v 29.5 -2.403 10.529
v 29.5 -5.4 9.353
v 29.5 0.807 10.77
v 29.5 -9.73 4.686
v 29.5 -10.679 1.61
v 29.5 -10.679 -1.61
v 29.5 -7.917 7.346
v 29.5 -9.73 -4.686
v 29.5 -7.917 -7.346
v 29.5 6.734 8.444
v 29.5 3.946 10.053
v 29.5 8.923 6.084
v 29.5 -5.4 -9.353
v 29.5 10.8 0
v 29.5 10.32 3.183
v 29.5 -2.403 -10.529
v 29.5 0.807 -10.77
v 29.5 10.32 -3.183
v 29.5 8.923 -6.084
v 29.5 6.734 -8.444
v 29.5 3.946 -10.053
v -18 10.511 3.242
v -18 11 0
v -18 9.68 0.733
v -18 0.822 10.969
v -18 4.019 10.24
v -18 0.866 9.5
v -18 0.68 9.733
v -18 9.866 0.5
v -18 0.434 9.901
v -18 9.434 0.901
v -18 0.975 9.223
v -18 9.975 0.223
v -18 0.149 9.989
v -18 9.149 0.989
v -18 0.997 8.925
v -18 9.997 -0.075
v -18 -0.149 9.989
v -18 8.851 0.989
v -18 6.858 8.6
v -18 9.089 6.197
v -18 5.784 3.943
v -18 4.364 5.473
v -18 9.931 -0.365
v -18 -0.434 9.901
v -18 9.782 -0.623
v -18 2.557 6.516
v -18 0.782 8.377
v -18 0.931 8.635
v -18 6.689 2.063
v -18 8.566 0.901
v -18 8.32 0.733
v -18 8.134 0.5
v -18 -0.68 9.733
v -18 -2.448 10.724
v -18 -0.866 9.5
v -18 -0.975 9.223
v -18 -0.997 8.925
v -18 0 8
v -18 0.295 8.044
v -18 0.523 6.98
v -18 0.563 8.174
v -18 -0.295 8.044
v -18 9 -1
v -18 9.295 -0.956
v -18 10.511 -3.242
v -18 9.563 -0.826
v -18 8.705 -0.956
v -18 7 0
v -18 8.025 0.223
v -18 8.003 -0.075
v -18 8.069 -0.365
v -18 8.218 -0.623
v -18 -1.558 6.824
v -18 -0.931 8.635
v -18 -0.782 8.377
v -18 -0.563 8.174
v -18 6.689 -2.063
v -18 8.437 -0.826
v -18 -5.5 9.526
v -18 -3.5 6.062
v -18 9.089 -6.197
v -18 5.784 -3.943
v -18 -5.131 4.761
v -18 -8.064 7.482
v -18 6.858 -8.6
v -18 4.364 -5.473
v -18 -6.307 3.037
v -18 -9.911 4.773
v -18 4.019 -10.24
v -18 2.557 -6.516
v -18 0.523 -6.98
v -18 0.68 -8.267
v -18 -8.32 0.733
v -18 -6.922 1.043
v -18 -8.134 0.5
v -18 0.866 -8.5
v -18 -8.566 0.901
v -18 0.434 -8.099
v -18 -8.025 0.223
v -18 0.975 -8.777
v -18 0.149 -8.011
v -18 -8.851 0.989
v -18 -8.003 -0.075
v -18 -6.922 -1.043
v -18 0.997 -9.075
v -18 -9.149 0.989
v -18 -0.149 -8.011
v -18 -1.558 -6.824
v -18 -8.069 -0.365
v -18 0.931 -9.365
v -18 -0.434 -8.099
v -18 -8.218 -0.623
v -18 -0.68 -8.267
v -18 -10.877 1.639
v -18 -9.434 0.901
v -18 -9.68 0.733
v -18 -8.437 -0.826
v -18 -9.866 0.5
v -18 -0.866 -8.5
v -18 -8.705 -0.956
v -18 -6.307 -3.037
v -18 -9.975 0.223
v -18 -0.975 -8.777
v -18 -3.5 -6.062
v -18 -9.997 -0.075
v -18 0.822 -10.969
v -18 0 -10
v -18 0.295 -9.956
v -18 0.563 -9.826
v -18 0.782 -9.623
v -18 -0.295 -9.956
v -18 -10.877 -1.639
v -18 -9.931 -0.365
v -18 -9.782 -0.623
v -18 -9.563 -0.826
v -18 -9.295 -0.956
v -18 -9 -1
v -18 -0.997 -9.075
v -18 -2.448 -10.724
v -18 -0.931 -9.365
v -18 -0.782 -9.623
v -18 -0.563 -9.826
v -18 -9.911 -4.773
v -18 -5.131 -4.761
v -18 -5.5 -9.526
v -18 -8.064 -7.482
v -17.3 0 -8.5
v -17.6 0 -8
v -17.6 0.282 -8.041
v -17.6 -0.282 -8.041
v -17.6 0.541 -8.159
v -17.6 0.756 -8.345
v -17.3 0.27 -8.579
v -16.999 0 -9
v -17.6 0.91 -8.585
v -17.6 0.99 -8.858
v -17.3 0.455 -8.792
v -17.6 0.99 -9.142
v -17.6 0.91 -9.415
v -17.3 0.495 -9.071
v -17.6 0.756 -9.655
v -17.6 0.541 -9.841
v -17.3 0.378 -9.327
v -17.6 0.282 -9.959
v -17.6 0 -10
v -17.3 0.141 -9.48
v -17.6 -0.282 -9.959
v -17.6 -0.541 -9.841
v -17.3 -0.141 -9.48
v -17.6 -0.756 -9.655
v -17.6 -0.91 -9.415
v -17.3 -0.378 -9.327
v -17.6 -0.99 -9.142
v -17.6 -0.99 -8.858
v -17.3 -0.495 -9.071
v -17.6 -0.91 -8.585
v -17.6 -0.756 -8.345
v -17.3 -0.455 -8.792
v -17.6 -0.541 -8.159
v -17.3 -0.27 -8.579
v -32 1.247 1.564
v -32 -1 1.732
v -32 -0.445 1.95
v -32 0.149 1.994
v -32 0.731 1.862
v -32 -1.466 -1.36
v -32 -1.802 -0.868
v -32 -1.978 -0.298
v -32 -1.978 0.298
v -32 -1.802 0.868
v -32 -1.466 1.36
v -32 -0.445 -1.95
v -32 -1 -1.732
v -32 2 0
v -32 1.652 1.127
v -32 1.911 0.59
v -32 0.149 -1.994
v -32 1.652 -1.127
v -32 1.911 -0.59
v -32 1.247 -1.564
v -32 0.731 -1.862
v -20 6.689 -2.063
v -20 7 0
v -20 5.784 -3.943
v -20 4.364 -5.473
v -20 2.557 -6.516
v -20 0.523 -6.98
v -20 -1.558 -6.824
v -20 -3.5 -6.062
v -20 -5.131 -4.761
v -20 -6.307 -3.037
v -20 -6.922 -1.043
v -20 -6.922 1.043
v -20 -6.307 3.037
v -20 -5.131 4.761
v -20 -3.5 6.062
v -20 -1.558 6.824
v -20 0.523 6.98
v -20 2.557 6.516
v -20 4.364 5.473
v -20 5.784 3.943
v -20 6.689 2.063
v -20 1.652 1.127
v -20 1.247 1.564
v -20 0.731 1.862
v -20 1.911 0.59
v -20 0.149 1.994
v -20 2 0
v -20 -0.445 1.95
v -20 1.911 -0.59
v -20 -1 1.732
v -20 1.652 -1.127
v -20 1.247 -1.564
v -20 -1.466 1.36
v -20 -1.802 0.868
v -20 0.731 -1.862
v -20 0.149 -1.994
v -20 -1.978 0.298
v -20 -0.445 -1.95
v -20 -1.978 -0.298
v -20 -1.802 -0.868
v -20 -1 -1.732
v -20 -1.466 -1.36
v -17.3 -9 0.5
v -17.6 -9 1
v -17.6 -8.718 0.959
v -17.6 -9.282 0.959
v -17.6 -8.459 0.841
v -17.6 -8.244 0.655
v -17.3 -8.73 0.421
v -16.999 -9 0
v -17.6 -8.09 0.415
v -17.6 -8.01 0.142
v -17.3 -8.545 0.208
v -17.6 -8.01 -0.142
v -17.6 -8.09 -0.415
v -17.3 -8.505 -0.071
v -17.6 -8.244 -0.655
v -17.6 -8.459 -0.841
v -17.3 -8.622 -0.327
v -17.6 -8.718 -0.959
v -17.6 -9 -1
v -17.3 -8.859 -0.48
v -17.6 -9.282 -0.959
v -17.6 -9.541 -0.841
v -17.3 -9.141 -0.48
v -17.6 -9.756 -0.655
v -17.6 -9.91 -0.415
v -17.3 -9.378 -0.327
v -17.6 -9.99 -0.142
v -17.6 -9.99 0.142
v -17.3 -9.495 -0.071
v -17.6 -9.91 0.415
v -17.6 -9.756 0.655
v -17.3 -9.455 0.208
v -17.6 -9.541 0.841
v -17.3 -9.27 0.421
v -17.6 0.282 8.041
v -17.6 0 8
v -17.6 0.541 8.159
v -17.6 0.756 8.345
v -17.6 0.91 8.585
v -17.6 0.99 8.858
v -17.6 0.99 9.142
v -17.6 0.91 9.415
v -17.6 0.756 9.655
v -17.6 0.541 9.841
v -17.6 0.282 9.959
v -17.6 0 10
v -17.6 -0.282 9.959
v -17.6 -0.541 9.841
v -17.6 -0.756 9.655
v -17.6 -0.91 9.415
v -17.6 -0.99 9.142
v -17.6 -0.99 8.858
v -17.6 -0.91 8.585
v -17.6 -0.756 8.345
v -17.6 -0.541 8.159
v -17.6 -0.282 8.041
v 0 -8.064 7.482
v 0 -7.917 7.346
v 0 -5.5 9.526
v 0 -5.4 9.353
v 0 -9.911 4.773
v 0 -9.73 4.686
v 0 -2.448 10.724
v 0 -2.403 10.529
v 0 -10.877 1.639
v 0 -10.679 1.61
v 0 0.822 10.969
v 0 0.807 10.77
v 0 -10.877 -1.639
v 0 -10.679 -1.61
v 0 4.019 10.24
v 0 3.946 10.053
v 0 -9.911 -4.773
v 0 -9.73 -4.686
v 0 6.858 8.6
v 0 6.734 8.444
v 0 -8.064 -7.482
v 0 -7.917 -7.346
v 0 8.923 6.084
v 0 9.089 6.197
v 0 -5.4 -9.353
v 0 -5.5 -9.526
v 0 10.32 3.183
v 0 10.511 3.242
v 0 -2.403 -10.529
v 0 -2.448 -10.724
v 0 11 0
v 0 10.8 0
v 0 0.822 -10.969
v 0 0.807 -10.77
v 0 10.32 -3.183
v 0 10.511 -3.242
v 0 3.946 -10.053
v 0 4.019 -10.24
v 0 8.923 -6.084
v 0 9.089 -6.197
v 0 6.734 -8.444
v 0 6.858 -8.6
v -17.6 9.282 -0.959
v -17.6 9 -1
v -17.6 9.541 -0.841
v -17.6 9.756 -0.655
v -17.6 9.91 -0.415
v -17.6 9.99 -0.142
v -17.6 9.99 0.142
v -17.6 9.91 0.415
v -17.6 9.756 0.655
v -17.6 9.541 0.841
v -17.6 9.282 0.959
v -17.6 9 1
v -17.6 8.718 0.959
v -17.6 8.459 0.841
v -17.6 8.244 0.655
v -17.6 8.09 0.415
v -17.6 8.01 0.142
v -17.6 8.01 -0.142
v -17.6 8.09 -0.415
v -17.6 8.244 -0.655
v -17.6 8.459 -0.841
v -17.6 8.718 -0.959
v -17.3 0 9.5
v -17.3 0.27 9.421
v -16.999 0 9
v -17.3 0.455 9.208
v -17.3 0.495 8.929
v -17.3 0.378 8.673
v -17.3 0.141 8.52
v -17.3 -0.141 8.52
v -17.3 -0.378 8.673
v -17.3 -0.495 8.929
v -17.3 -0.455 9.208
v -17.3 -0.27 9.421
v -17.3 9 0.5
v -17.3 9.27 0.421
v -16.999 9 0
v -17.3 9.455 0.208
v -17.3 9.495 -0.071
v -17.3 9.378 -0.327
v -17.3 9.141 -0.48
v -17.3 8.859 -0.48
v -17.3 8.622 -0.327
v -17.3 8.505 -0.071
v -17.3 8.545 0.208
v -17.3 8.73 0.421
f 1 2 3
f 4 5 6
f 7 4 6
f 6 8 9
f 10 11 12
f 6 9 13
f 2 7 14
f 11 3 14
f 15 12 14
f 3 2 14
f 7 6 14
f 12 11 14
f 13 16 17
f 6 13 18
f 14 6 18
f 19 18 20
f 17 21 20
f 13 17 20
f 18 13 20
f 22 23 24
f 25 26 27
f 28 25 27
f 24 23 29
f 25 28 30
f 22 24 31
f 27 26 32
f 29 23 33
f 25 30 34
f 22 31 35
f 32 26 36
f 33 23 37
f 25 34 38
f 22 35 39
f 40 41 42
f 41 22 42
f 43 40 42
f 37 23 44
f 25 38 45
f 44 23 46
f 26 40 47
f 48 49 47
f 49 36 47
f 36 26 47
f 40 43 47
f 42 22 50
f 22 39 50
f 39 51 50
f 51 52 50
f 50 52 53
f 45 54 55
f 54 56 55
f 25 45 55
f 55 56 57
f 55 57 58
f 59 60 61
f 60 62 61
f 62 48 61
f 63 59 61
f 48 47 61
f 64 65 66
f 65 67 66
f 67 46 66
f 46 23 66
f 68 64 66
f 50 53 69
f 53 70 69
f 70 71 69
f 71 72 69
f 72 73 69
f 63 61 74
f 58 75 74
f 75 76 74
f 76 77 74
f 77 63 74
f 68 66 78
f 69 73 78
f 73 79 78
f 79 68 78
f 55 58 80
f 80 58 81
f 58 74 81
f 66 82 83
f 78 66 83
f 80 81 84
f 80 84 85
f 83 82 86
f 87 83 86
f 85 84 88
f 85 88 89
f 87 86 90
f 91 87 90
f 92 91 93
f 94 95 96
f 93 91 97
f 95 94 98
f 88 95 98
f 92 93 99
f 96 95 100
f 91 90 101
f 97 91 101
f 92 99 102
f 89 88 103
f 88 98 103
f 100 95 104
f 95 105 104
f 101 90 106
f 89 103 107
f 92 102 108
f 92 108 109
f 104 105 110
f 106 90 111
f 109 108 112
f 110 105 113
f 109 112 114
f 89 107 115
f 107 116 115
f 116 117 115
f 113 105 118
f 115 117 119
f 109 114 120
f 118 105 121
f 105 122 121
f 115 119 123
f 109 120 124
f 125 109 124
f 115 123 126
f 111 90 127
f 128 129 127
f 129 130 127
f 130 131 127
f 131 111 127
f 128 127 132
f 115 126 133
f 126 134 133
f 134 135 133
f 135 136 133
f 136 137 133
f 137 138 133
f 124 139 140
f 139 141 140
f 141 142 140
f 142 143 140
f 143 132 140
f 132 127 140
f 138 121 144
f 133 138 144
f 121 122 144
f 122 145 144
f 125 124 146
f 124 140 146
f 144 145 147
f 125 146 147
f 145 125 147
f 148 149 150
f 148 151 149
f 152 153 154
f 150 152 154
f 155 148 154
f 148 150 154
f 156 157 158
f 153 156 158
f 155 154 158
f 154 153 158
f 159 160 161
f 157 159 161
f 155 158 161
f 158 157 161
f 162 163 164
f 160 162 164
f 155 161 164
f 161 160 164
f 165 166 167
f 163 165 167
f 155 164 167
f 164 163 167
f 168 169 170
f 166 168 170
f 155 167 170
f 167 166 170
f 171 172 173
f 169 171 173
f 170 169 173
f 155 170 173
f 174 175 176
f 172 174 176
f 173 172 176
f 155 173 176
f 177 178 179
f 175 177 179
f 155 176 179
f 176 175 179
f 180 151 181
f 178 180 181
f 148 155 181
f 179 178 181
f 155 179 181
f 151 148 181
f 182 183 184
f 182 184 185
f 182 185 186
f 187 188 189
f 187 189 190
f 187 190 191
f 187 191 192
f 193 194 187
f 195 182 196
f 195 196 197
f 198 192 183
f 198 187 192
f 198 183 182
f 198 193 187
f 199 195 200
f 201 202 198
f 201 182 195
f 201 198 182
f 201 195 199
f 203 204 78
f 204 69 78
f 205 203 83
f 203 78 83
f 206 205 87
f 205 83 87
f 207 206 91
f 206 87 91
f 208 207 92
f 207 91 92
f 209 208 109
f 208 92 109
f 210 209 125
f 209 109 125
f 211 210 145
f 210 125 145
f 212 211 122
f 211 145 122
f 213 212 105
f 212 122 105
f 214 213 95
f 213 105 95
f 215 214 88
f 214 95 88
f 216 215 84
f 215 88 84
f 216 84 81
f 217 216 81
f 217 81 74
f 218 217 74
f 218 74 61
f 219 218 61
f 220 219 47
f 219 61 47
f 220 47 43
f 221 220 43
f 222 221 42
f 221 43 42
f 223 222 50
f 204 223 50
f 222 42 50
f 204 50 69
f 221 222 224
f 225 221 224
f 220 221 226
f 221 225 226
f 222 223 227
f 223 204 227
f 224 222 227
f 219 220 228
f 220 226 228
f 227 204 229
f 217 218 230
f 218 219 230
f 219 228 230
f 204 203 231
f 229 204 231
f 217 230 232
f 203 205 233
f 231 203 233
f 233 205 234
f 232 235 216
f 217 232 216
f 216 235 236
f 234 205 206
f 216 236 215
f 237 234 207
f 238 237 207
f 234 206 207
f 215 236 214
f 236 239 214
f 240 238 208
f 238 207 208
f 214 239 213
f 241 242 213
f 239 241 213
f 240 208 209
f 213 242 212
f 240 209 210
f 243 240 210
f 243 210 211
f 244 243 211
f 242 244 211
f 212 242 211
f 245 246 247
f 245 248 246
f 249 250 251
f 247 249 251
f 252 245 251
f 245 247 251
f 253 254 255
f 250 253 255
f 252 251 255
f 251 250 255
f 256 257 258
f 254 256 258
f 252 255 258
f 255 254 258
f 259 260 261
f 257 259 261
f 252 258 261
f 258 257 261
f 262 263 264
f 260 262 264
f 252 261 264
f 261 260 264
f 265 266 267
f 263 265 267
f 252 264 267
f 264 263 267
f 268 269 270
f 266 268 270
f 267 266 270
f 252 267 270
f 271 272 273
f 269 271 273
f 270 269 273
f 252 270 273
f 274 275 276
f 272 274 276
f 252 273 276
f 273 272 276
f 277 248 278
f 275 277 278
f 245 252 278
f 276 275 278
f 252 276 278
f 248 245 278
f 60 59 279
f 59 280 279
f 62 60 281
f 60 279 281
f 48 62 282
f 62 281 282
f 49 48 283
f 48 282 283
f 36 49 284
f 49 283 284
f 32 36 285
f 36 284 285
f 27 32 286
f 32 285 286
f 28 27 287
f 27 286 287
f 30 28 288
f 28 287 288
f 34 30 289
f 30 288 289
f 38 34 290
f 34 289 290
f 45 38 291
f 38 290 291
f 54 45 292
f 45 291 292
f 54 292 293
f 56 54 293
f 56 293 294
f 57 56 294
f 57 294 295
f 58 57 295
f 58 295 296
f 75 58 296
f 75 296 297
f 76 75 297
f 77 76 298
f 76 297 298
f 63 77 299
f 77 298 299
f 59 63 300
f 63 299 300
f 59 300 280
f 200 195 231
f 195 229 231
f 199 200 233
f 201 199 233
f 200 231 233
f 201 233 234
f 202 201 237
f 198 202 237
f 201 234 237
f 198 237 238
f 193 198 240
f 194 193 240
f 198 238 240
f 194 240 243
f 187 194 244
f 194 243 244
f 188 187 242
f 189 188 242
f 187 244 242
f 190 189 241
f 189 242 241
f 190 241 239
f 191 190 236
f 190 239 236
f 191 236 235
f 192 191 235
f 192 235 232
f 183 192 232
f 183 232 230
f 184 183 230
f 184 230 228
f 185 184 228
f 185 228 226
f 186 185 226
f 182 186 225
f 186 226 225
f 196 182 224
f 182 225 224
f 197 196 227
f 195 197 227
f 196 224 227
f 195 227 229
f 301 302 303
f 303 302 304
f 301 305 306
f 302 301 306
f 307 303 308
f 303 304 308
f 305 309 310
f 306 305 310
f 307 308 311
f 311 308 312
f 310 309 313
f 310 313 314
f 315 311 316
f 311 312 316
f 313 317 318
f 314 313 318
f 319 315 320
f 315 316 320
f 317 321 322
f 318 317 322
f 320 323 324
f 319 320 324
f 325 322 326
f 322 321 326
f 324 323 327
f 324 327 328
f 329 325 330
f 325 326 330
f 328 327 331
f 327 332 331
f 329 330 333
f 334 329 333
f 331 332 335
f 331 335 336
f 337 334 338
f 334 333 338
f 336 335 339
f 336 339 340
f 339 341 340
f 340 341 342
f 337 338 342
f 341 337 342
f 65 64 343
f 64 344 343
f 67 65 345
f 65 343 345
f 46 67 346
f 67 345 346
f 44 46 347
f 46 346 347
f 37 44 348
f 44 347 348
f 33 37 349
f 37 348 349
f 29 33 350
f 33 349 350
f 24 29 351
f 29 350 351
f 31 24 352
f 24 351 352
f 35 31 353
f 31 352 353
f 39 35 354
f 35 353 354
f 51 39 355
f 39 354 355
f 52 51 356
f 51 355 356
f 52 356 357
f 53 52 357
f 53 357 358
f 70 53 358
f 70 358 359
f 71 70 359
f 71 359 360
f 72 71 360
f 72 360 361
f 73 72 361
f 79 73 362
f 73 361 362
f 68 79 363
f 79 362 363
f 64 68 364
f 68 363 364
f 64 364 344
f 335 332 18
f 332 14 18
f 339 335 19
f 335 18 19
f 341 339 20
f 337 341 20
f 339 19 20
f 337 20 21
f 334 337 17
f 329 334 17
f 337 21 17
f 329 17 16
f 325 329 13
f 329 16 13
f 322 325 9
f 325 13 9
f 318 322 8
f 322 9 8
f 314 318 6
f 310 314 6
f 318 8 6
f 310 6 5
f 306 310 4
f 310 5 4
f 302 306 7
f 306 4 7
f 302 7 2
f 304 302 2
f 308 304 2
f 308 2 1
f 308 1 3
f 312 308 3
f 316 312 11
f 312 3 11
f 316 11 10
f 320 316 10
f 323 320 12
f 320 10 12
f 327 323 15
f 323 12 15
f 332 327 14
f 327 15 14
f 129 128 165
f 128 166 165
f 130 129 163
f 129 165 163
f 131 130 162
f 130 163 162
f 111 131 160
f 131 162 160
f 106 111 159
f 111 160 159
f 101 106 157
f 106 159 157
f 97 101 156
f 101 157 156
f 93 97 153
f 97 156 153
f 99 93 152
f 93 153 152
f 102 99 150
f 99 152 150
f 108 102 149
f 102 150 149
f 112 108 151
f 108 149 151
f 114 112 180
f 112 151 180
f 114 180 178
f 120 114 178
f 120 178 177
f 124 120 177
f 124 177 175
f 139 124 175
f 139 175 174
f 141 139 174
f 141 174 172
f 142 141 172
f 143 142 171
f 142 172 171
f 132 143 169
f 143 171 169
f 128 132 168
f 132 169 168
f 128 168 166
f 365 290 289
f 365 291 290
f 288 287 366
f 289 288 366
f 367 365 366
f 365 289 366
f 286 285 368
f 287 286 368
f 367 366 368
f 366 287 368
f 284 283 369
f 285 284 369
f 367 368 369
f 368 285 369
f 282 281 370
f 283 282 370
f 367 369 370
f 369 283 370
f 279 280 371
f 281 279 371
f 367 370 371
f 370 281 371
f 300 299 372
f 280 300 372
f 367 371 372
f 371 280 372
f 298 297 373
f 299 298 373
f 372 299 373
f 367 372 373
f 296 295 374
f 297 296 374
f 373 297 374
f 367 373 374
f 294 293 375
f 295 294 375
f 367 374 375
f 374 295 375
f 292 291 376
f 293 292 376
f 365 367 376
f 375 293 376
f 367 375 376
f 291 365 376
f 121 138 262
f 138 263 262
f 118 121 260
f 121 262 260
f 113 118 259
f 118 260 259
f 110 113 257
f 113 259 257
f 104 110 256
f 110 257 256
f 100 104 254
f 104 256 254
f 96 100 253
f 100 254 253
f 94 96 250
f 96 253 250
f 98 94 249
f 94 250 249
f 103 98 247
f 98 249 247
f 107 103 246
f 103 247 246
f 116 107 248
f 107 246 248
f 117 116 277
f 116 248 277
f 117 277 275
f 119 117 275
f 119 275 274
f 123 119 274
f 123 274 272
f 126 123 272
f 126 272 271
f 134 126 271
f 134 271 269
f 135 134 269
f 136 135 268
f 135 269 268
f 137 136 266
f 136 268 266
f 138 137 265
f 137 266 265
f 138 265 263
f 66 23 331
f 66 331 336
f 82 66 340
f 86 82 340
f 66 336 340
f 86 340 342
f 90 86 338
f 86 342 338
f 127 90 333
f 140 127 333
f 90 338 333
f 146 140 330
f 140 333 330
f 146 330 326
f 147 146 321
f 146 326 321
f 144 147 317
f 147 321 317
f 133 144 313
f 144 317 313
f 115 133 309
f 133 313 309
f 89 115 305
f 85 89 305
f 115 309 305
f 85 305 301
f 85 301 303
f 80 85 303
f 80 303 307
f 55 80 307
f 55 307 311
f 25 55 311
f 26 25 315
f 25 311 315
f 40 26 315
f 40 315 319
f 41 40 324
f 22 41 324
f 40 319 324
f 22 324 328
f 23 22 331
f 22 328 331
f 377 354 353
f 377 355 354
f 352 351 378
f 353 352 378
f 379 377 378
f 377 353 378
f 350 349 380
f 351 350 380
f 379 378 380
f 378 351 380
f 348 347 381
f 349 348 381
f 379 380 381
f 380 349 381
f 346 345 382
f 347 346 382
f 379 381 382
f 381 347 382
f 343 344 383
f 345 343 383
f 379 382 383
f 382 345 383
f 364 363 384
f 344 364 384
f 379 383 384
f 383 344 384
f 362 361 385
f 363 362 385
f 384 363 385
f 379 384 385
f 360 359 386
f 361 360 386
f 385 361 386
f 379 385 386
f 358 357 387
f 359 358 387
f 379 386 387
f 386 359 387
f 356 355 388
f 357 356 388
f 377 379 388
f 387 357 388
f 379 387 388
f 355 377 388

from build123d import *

# Parameters (mm, degrees)
SKETCH2_W                 = 29.5
SKETCH2_H                 = 10.8
SKETCH2_W_2               = 12
SKETCH2_H_2               = 2
F_2_0MM_DOWEL_HOLE1_D     = 2
F_2_0MM_DOWEL_HOLE1_DEPTH = 0.4
F_2_0MM_DOWEL_HOLE1_TIP   = 0.600860619


with BuildPart() as part:
    # Sketch2 → Revolve1 (revolve)
    with BuildSketch(Plane.XY, mode=Mode.PRIVATE) as revolve1_sk:
        Polygon((0, -10.8), (0, 0), (-18, 0), (-18, -7), (-18, -11), (0, -11), align=None)
        with Locations((14.75, -5.4)):
            Rectangle(SKETCH2_W, SKETCH2_H)
        Polygon((-18, -7), (-18, 0), (-20, 0), (-20, -2), (-20, -7), align=None)
        with Locations((-26, -1)):
            Rectangle(SKETCH2_W_2, SKETCH2_H_2)
    revolve(revolve1_sk.sketch.rotate(Axis((0, 0, 0), (-1, 0, 0)), 180), axis=Axis((0, 0, 0), (-1, 0, 0)))

    # Ø2.0mm Dowel Hole1
    with Locations(Plane.ZY.offset(18)):
        with Locations((-9, 0), (0, 9), (9, 0), (0, -9)):
            Hole(F_2_0MM_DOWEL_HOLE1_D / 2, depth=F_2_0MM_DOWEL_HOLE1_DEPTH)
            with Locations((0, 0, -(F_2_0MM_DOWEL_HOLE1_DEPTH + F_2_0MM_DOWEL_HOLE1_TIP / 2))):  # 118° drill point
                Cone(0, F_2_0MM_DOWEL_HOLE1_D / 2, F_2_0MM_DOWEL_HOLE1_TIP, mode=Mode.SUBTRACT)


solid = part.part
